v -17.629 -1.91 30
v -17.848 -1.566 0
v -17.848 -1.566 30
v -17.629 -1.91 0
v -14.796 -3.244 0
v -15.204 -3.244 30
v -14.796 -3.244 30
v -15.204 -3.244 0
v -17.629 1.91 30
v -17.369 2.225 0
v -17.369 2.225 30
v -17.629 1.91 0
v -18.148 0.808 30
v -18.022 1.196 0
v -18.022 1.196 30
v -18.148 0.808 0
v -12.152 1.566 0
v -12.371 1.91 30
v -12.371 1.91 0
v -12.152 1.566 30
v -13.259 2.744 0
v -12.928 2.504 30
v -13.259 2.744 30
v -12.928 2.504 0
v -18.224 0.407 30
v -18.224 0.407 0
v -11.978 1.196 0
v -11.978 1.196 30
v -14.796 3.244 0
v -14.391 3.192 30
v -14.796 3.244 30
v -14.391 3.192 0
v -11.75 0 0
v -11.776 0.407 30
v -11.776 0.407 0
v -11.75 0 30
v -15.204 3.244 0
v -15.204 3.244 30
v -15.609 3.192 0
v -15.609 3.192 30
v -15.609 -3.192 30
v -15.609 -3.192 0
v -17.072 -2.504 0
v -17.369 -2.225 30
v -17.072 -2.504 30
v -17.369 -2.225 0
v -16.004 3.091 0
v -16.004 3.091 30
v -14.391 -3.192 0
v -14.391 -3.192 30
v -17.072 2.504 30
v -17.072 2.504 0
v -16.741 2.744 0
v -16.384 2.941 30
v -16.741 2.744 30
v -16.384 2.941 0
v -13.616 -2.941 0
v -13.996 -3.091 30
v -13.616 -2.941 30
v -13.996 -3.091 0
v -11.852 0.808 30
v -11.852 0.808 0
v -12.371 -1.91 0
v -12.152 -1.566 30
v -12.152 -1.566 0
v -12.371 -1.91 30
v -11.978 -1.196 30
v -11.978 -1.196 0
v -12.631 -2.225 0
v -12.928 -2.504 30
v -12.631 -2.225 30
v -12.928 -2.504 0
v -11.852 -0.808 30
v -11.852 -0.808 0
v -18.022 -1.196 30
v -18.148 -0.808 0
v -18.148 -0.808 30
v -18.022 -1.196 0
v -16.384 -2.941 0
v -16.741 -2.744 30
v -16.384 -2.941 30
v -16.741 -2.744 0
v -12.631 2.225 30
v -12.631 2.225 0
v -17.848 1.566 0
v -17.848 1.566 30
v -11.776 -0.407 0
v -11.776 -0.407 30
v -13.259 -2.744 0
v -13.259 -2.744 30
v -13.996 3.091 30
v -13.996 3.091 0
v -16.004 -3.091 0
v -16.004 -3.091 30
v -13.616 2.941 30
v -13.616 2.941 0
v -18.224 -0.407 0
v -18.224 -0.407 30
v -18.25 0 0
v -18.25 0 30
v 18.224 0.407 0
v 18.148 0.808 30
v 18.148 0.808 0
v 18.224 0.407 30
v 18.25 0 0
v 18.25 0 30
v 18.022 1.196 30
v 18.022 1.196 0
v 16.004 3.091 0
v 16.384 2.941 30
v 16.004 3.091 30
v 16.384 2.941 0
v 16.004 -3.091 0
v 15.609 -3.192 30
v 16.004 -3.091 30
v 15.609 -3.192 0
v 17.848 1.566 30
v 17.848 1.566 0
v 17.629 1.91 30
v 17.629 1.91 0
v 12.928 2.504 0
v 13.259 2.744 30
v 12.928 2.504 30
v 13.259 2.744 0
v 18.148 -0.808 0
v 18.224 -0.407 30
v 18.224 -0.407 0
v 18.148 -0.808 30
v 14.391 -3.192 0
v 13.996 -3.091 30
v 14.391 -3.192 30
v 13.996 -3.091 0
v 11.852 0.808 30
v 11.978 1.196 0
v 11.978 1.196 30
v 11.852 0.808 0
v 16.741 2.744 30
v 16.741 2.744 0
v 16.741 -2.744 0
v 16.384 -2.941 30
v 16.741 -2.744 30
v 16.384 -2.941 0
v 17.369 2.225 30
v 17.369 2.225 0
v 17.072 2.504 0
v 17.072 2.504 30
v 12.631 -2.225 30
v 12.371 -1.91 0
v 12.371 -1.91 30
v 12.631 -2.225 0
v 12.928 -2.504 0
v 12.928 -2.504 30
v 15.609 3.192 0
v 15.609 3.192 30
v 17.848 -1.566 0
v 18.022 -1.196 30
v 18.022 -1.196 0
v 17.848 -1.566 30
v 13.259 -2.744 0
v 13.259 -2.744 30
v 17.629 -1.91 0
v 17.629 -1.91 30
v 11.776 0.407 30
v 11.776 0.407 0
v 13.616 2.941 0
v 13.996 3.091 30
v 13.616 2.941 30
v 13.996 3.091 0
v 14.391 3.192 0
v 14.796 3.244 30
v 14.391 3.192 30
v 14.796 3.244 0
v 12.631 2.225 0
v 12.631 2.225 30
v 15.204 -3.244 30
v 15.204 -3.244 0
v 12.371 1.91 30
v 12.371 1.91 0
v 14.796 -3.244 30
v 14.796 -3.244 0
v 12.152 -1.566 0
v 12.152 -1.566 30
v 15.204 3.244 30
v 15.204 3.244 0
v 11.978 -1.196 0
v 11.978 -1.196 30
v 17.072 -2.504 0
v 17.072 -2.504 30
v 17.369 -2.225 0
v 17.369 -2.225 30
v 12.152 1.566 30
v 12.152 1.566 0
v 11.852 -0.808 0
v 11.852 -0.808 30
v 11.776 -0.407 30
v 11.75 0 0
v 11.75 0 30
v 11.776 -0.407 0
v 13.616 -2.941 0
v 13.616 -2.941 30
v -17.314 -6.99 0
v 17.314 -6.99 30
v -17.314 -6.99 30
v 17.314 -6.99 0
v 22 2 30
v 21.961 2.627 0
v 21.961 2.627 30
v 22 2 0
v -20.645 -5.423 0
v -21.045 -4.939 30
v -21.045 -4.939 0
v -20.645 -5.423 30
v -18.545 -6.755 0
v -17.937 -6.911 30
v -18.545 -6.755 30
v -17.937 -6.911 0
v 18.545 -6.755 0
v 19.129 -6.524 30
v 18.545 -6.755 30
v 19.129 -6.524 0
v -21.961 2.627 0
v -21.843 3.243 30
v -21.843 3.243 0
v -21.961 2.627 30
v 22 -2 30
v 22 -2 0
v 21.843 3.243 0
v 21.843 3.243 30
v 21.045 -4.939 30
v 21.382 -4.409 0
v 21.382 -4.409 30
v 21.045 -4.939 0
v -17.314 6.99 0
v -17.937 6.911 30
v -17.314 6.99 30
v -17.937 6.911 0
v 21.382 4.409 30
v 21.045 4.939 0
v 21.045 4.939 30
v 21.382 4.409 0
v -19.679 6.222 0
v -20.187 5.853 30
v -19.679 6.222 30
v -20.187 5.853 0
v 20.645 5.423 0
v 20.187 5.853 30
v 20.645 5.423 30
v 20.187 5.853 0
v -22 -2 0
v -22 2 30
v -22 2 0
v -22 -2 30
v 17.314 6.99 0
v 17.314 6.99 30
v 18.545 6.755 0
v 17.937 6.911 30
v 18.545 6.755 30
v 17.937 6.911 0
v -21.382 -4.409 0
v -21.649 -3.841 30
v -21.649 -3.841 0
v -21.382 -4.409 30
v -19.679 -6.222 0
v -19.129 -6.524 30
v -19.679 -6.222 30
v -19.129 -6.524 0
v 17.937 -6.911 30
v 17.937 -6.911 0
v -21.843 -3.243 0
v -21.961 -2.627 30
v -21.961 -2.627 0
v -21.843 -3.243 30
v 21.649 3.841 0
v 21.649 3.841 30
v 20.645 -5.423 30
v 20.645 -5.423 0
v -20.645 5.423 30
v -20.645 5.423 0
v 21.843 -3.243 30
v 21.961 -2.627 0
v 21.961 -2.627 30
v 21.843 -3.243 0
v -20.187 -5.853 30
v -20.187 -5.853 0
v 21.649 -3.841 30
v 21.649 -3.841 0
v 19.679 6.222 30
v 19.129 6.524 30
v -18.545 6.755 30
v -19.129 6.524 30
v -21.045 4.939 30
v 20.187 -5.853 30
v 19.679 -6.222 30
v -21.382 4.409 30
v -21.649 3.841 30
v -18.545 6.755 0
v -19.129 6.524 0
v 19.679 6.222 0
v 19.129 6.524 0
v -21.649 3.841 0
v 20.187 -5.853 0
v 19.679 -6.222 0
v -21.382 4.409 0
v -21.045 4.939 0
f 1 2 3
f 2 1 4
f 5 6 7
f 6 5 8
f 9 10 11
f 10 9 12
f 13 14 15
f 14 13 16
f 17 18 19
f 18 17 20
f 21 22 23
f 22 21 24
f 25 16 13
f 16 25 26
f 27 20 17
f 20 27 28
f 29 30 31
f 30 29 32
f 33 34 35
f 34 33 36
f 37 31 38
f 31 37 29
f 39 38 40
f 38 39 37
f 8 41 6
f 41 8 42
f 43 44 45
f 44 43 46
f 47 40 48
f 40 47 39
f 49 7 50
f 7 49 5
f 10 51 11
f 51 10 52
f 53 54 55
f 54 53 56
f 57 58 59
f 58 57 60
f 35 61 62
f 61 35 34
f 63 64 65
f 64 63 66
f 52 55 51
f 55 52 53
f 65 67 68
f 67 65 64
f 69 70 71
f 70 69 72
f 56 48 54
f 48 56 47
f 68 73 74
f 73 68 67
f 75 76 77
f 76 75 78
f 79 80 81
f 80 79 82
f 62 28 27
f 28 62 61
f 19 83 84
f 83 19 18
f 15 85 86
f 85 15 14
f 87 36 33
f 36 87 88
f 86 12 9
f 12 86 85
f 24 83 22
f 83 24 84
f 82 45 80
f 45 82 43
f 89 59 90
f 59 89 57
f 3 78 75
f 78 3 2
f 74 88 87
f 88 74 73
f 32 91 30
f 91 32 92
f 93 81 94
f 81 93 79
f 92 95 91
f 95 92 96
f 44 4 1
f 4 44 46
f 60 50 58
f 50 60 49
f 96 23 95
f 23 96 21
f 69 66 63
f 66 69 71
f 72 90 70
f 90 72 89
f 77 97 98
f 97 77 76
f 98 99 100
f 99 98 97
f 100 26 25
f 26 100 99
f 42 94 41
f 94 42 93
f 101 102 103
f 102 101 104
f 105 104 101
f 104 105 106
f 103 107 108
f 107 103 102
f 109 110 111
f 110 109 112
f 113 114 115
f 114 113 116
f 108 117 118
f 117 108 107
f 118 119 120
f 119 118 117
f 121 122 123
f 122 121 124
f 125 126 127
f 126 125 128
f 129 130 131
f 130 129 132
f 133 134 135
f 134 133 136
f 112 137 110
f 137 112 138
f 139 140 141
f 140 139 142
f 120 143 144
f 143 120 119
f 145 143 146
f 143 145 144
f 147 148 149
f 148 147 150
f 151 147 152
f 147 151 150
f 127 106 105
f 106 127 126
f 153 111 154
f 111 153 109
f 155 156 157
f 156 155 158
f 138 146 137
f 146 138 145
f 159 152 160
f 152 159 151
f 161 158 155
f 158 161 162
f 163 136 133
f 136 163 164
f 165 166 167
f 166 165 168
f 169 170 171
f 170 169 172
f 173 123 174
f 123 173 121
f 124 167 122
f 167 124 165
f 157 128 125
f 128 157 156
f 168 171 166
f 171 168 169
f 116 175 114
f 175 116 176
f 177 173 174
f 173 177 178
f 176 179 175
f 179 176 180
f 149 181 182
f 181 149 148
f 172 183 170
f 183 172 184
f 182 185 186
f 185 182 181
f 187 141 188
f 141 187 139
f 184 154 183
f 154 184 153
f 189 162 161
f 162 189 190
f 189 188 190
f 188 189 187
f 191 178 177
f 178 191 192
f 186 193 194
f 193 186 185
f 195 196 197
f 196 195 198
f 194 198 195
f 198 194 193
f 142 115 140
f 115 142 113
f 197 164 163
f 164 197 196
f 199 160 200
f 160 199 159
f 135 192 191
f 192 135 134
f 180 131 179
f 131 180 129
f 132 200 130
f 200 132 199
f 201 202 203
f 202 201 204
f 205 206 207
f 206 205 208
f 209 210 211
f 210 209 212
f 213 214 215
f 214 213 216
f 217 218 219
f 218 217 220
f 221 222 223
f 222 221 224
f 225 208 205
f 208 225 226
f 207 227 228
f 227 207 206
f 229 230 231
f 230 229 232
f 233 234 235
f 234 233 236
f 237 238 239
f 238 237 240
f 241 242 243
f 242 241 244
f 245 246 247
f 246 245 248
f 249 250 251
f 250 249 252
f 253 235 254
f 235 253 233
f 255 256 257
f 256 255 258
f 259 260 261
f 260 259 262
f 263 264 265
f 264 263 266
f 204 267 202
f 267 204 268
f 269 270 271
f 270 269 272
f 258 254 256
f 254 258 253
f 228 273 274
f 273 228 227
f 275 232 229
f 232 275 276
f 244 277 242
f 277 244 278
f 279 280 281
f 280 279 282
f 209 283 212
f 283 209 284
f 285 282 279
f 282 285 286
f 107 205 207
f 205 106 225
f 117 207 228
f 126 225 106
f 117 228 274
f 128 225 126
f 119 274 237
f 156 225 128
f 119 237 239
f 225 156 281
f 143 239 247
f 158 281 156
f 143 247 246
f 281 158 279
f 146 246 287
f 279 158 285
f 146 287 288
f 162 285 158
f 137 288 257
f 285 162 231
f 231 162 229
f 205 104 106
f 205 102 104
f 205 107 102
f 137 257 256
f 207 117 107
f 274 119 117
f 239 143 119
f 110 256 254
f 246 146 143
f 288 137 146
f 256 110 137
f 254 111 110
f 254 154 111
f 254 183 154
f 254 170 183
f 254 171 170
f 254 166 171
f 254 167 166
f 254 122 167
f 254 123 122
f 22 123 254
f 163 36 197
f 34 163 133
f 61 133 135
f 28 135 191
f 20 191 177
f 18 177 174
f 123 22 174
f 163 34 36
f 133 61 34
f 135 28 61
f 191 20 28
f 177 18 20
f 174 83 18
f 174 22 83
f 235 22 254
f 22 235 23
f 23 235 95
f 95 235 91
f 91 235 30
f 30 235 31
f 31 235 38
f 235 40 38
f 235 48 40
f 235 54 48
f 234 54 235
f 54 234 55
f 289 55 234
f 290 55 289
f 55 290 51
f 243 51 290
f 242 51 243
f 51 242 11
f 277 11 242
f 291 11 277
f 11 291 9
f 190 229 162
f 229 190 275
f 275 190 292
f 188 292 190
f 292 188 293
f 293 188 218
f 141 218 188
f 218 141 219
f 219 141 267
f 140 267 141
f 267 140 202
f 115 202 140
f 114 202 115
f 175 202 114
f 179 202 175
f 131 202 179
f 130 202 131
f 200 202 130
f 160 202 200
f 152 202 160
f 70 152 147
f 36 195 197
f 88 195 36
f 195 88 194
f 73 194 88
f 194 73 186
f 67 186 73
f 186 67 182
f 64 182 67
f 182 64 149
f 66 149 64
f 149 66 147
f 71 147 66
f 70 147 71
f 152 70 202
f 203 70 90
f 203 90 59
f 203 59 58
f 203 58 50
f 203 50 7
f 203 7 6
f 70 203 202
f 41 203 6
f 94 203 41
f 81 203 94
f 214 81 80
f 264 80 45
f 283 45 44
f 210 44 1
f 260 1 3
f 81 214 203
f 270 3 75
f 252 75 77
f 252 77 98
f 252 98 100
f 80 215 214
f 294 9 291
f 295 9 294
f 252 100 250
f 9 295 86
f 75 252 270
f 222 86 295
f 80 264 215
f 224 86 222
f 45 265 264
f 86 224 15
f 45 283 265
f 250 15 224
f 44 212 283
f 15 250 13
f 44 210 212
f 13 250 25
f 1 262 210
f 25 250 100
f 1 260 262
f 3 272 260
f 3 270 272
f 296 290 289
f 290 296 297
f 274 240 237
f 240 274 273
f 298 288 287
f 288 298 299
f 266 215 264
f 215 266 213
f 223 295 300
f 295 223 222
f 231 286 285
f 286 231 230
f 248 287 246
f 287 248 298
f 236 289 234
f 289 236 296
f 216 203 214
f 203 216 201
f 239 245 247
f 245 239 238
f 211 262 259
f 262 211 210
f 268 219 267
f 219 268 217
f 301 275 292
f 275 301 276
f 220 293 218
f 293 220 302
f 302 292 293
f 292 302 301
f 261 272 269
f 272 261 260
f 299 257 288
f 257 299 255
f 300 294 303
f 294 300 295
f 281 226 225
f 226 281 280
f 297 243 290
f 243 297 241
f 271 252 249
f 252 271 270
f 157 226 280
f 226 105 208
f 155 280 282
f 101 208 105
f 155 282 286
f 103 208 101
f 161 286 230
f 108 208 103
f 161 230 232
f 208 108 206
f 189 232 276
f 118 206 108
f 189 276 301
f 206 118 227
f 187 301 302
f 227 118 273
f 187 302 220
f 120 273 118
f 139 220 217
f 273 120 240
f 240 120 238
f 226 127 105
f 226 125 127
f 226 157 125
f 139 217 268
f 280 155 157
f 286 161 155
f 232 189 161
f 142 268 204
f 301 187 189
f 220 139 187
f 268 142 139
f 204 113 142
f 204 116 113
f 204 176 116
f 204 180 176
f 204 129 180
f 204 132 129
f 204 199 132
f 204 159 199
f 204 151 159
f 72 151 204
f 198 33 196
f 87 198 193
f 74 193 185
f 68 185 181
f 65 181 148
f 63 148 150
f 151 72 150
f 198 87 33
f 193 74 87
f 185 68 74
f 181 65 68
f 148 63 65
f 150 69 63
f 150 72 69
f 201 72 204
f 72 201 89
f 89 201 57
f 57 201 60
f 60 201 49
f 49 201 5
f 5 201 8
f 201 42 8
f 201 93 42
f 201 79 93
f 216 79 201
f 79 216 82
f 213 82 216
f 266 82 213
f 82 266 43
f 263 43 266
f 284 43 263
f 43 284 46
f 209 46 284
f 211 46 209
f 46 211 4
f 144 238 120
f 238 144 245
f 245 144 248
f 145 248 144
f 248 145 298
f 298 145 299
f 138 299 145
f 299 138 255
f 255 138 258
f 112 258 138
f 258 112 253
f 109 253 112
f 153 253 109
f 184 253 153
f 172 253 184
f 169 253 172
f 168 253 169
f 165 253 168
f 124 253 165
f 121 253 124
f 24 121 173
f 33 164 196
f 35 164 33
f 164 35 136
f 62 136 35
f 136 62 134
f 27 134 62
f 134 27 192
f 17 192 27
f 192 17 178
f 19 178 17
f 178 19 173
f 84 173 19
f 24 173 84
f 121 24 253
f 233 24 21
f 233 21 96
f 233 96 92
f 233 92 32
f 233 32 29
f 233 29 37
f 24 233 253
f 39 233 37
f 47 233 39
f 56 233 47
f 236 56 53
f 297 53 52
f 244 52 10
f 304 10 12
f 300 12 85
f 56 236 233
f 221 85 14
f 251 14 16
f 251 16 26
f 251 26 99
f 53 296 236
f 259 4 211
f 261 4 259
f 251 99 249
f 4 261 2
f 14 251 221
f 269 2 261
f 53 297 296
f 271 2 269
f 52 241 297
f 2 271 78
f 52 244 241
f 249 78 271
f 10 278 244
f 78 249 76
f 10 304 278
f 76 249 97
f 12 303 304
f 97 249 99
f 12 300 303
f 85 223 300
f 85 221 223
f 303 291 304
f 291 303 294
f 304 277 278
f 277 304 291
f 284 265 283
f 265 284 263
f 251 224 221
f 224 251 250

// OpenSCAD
$fn = 50;


difference() {
	union() {
		hull() {
			translate(v = [-17.0000000000, 2.0000000000, 0]) {
				cylinder(h = 30, r = 5);
			}
			translate(v = [17.0000000000, 2.0000000000, 0]) {
				cylinder(h = 30, r = 5);
			}
			translate(v = [-17.0000000000, -2.0000000000, 0]) {
				cylinder(h = 30, r = 5);
			}
			translate(v = [17.0000000000, -2.0000000000, 0]) {
				cylinder(h = 30, r = 5);
			}
		}
	}
	union() {
		translate(v = [-15.0000000000, 0.0000000000, -100.0000000000]) {
			cylinder(h = 200, r = 3.2500000000);
		}
		translate(v = [-15.0000000000, 0.0000000000, -100.0000000000]) {
			cylinder(h = 200, r = 3.2500000000);
		}
		translate(v = [15.0000000000, 0.0000000000, -100.0000000000]) {
			cylinder(h = 200, r = 3.2500000000);
		}
		translate(v = [15.0000000000, 0.0000000000, -100.0000000000]) {
			cylinder(h = 200, r = 3.2500000000);
		}
	}
}
